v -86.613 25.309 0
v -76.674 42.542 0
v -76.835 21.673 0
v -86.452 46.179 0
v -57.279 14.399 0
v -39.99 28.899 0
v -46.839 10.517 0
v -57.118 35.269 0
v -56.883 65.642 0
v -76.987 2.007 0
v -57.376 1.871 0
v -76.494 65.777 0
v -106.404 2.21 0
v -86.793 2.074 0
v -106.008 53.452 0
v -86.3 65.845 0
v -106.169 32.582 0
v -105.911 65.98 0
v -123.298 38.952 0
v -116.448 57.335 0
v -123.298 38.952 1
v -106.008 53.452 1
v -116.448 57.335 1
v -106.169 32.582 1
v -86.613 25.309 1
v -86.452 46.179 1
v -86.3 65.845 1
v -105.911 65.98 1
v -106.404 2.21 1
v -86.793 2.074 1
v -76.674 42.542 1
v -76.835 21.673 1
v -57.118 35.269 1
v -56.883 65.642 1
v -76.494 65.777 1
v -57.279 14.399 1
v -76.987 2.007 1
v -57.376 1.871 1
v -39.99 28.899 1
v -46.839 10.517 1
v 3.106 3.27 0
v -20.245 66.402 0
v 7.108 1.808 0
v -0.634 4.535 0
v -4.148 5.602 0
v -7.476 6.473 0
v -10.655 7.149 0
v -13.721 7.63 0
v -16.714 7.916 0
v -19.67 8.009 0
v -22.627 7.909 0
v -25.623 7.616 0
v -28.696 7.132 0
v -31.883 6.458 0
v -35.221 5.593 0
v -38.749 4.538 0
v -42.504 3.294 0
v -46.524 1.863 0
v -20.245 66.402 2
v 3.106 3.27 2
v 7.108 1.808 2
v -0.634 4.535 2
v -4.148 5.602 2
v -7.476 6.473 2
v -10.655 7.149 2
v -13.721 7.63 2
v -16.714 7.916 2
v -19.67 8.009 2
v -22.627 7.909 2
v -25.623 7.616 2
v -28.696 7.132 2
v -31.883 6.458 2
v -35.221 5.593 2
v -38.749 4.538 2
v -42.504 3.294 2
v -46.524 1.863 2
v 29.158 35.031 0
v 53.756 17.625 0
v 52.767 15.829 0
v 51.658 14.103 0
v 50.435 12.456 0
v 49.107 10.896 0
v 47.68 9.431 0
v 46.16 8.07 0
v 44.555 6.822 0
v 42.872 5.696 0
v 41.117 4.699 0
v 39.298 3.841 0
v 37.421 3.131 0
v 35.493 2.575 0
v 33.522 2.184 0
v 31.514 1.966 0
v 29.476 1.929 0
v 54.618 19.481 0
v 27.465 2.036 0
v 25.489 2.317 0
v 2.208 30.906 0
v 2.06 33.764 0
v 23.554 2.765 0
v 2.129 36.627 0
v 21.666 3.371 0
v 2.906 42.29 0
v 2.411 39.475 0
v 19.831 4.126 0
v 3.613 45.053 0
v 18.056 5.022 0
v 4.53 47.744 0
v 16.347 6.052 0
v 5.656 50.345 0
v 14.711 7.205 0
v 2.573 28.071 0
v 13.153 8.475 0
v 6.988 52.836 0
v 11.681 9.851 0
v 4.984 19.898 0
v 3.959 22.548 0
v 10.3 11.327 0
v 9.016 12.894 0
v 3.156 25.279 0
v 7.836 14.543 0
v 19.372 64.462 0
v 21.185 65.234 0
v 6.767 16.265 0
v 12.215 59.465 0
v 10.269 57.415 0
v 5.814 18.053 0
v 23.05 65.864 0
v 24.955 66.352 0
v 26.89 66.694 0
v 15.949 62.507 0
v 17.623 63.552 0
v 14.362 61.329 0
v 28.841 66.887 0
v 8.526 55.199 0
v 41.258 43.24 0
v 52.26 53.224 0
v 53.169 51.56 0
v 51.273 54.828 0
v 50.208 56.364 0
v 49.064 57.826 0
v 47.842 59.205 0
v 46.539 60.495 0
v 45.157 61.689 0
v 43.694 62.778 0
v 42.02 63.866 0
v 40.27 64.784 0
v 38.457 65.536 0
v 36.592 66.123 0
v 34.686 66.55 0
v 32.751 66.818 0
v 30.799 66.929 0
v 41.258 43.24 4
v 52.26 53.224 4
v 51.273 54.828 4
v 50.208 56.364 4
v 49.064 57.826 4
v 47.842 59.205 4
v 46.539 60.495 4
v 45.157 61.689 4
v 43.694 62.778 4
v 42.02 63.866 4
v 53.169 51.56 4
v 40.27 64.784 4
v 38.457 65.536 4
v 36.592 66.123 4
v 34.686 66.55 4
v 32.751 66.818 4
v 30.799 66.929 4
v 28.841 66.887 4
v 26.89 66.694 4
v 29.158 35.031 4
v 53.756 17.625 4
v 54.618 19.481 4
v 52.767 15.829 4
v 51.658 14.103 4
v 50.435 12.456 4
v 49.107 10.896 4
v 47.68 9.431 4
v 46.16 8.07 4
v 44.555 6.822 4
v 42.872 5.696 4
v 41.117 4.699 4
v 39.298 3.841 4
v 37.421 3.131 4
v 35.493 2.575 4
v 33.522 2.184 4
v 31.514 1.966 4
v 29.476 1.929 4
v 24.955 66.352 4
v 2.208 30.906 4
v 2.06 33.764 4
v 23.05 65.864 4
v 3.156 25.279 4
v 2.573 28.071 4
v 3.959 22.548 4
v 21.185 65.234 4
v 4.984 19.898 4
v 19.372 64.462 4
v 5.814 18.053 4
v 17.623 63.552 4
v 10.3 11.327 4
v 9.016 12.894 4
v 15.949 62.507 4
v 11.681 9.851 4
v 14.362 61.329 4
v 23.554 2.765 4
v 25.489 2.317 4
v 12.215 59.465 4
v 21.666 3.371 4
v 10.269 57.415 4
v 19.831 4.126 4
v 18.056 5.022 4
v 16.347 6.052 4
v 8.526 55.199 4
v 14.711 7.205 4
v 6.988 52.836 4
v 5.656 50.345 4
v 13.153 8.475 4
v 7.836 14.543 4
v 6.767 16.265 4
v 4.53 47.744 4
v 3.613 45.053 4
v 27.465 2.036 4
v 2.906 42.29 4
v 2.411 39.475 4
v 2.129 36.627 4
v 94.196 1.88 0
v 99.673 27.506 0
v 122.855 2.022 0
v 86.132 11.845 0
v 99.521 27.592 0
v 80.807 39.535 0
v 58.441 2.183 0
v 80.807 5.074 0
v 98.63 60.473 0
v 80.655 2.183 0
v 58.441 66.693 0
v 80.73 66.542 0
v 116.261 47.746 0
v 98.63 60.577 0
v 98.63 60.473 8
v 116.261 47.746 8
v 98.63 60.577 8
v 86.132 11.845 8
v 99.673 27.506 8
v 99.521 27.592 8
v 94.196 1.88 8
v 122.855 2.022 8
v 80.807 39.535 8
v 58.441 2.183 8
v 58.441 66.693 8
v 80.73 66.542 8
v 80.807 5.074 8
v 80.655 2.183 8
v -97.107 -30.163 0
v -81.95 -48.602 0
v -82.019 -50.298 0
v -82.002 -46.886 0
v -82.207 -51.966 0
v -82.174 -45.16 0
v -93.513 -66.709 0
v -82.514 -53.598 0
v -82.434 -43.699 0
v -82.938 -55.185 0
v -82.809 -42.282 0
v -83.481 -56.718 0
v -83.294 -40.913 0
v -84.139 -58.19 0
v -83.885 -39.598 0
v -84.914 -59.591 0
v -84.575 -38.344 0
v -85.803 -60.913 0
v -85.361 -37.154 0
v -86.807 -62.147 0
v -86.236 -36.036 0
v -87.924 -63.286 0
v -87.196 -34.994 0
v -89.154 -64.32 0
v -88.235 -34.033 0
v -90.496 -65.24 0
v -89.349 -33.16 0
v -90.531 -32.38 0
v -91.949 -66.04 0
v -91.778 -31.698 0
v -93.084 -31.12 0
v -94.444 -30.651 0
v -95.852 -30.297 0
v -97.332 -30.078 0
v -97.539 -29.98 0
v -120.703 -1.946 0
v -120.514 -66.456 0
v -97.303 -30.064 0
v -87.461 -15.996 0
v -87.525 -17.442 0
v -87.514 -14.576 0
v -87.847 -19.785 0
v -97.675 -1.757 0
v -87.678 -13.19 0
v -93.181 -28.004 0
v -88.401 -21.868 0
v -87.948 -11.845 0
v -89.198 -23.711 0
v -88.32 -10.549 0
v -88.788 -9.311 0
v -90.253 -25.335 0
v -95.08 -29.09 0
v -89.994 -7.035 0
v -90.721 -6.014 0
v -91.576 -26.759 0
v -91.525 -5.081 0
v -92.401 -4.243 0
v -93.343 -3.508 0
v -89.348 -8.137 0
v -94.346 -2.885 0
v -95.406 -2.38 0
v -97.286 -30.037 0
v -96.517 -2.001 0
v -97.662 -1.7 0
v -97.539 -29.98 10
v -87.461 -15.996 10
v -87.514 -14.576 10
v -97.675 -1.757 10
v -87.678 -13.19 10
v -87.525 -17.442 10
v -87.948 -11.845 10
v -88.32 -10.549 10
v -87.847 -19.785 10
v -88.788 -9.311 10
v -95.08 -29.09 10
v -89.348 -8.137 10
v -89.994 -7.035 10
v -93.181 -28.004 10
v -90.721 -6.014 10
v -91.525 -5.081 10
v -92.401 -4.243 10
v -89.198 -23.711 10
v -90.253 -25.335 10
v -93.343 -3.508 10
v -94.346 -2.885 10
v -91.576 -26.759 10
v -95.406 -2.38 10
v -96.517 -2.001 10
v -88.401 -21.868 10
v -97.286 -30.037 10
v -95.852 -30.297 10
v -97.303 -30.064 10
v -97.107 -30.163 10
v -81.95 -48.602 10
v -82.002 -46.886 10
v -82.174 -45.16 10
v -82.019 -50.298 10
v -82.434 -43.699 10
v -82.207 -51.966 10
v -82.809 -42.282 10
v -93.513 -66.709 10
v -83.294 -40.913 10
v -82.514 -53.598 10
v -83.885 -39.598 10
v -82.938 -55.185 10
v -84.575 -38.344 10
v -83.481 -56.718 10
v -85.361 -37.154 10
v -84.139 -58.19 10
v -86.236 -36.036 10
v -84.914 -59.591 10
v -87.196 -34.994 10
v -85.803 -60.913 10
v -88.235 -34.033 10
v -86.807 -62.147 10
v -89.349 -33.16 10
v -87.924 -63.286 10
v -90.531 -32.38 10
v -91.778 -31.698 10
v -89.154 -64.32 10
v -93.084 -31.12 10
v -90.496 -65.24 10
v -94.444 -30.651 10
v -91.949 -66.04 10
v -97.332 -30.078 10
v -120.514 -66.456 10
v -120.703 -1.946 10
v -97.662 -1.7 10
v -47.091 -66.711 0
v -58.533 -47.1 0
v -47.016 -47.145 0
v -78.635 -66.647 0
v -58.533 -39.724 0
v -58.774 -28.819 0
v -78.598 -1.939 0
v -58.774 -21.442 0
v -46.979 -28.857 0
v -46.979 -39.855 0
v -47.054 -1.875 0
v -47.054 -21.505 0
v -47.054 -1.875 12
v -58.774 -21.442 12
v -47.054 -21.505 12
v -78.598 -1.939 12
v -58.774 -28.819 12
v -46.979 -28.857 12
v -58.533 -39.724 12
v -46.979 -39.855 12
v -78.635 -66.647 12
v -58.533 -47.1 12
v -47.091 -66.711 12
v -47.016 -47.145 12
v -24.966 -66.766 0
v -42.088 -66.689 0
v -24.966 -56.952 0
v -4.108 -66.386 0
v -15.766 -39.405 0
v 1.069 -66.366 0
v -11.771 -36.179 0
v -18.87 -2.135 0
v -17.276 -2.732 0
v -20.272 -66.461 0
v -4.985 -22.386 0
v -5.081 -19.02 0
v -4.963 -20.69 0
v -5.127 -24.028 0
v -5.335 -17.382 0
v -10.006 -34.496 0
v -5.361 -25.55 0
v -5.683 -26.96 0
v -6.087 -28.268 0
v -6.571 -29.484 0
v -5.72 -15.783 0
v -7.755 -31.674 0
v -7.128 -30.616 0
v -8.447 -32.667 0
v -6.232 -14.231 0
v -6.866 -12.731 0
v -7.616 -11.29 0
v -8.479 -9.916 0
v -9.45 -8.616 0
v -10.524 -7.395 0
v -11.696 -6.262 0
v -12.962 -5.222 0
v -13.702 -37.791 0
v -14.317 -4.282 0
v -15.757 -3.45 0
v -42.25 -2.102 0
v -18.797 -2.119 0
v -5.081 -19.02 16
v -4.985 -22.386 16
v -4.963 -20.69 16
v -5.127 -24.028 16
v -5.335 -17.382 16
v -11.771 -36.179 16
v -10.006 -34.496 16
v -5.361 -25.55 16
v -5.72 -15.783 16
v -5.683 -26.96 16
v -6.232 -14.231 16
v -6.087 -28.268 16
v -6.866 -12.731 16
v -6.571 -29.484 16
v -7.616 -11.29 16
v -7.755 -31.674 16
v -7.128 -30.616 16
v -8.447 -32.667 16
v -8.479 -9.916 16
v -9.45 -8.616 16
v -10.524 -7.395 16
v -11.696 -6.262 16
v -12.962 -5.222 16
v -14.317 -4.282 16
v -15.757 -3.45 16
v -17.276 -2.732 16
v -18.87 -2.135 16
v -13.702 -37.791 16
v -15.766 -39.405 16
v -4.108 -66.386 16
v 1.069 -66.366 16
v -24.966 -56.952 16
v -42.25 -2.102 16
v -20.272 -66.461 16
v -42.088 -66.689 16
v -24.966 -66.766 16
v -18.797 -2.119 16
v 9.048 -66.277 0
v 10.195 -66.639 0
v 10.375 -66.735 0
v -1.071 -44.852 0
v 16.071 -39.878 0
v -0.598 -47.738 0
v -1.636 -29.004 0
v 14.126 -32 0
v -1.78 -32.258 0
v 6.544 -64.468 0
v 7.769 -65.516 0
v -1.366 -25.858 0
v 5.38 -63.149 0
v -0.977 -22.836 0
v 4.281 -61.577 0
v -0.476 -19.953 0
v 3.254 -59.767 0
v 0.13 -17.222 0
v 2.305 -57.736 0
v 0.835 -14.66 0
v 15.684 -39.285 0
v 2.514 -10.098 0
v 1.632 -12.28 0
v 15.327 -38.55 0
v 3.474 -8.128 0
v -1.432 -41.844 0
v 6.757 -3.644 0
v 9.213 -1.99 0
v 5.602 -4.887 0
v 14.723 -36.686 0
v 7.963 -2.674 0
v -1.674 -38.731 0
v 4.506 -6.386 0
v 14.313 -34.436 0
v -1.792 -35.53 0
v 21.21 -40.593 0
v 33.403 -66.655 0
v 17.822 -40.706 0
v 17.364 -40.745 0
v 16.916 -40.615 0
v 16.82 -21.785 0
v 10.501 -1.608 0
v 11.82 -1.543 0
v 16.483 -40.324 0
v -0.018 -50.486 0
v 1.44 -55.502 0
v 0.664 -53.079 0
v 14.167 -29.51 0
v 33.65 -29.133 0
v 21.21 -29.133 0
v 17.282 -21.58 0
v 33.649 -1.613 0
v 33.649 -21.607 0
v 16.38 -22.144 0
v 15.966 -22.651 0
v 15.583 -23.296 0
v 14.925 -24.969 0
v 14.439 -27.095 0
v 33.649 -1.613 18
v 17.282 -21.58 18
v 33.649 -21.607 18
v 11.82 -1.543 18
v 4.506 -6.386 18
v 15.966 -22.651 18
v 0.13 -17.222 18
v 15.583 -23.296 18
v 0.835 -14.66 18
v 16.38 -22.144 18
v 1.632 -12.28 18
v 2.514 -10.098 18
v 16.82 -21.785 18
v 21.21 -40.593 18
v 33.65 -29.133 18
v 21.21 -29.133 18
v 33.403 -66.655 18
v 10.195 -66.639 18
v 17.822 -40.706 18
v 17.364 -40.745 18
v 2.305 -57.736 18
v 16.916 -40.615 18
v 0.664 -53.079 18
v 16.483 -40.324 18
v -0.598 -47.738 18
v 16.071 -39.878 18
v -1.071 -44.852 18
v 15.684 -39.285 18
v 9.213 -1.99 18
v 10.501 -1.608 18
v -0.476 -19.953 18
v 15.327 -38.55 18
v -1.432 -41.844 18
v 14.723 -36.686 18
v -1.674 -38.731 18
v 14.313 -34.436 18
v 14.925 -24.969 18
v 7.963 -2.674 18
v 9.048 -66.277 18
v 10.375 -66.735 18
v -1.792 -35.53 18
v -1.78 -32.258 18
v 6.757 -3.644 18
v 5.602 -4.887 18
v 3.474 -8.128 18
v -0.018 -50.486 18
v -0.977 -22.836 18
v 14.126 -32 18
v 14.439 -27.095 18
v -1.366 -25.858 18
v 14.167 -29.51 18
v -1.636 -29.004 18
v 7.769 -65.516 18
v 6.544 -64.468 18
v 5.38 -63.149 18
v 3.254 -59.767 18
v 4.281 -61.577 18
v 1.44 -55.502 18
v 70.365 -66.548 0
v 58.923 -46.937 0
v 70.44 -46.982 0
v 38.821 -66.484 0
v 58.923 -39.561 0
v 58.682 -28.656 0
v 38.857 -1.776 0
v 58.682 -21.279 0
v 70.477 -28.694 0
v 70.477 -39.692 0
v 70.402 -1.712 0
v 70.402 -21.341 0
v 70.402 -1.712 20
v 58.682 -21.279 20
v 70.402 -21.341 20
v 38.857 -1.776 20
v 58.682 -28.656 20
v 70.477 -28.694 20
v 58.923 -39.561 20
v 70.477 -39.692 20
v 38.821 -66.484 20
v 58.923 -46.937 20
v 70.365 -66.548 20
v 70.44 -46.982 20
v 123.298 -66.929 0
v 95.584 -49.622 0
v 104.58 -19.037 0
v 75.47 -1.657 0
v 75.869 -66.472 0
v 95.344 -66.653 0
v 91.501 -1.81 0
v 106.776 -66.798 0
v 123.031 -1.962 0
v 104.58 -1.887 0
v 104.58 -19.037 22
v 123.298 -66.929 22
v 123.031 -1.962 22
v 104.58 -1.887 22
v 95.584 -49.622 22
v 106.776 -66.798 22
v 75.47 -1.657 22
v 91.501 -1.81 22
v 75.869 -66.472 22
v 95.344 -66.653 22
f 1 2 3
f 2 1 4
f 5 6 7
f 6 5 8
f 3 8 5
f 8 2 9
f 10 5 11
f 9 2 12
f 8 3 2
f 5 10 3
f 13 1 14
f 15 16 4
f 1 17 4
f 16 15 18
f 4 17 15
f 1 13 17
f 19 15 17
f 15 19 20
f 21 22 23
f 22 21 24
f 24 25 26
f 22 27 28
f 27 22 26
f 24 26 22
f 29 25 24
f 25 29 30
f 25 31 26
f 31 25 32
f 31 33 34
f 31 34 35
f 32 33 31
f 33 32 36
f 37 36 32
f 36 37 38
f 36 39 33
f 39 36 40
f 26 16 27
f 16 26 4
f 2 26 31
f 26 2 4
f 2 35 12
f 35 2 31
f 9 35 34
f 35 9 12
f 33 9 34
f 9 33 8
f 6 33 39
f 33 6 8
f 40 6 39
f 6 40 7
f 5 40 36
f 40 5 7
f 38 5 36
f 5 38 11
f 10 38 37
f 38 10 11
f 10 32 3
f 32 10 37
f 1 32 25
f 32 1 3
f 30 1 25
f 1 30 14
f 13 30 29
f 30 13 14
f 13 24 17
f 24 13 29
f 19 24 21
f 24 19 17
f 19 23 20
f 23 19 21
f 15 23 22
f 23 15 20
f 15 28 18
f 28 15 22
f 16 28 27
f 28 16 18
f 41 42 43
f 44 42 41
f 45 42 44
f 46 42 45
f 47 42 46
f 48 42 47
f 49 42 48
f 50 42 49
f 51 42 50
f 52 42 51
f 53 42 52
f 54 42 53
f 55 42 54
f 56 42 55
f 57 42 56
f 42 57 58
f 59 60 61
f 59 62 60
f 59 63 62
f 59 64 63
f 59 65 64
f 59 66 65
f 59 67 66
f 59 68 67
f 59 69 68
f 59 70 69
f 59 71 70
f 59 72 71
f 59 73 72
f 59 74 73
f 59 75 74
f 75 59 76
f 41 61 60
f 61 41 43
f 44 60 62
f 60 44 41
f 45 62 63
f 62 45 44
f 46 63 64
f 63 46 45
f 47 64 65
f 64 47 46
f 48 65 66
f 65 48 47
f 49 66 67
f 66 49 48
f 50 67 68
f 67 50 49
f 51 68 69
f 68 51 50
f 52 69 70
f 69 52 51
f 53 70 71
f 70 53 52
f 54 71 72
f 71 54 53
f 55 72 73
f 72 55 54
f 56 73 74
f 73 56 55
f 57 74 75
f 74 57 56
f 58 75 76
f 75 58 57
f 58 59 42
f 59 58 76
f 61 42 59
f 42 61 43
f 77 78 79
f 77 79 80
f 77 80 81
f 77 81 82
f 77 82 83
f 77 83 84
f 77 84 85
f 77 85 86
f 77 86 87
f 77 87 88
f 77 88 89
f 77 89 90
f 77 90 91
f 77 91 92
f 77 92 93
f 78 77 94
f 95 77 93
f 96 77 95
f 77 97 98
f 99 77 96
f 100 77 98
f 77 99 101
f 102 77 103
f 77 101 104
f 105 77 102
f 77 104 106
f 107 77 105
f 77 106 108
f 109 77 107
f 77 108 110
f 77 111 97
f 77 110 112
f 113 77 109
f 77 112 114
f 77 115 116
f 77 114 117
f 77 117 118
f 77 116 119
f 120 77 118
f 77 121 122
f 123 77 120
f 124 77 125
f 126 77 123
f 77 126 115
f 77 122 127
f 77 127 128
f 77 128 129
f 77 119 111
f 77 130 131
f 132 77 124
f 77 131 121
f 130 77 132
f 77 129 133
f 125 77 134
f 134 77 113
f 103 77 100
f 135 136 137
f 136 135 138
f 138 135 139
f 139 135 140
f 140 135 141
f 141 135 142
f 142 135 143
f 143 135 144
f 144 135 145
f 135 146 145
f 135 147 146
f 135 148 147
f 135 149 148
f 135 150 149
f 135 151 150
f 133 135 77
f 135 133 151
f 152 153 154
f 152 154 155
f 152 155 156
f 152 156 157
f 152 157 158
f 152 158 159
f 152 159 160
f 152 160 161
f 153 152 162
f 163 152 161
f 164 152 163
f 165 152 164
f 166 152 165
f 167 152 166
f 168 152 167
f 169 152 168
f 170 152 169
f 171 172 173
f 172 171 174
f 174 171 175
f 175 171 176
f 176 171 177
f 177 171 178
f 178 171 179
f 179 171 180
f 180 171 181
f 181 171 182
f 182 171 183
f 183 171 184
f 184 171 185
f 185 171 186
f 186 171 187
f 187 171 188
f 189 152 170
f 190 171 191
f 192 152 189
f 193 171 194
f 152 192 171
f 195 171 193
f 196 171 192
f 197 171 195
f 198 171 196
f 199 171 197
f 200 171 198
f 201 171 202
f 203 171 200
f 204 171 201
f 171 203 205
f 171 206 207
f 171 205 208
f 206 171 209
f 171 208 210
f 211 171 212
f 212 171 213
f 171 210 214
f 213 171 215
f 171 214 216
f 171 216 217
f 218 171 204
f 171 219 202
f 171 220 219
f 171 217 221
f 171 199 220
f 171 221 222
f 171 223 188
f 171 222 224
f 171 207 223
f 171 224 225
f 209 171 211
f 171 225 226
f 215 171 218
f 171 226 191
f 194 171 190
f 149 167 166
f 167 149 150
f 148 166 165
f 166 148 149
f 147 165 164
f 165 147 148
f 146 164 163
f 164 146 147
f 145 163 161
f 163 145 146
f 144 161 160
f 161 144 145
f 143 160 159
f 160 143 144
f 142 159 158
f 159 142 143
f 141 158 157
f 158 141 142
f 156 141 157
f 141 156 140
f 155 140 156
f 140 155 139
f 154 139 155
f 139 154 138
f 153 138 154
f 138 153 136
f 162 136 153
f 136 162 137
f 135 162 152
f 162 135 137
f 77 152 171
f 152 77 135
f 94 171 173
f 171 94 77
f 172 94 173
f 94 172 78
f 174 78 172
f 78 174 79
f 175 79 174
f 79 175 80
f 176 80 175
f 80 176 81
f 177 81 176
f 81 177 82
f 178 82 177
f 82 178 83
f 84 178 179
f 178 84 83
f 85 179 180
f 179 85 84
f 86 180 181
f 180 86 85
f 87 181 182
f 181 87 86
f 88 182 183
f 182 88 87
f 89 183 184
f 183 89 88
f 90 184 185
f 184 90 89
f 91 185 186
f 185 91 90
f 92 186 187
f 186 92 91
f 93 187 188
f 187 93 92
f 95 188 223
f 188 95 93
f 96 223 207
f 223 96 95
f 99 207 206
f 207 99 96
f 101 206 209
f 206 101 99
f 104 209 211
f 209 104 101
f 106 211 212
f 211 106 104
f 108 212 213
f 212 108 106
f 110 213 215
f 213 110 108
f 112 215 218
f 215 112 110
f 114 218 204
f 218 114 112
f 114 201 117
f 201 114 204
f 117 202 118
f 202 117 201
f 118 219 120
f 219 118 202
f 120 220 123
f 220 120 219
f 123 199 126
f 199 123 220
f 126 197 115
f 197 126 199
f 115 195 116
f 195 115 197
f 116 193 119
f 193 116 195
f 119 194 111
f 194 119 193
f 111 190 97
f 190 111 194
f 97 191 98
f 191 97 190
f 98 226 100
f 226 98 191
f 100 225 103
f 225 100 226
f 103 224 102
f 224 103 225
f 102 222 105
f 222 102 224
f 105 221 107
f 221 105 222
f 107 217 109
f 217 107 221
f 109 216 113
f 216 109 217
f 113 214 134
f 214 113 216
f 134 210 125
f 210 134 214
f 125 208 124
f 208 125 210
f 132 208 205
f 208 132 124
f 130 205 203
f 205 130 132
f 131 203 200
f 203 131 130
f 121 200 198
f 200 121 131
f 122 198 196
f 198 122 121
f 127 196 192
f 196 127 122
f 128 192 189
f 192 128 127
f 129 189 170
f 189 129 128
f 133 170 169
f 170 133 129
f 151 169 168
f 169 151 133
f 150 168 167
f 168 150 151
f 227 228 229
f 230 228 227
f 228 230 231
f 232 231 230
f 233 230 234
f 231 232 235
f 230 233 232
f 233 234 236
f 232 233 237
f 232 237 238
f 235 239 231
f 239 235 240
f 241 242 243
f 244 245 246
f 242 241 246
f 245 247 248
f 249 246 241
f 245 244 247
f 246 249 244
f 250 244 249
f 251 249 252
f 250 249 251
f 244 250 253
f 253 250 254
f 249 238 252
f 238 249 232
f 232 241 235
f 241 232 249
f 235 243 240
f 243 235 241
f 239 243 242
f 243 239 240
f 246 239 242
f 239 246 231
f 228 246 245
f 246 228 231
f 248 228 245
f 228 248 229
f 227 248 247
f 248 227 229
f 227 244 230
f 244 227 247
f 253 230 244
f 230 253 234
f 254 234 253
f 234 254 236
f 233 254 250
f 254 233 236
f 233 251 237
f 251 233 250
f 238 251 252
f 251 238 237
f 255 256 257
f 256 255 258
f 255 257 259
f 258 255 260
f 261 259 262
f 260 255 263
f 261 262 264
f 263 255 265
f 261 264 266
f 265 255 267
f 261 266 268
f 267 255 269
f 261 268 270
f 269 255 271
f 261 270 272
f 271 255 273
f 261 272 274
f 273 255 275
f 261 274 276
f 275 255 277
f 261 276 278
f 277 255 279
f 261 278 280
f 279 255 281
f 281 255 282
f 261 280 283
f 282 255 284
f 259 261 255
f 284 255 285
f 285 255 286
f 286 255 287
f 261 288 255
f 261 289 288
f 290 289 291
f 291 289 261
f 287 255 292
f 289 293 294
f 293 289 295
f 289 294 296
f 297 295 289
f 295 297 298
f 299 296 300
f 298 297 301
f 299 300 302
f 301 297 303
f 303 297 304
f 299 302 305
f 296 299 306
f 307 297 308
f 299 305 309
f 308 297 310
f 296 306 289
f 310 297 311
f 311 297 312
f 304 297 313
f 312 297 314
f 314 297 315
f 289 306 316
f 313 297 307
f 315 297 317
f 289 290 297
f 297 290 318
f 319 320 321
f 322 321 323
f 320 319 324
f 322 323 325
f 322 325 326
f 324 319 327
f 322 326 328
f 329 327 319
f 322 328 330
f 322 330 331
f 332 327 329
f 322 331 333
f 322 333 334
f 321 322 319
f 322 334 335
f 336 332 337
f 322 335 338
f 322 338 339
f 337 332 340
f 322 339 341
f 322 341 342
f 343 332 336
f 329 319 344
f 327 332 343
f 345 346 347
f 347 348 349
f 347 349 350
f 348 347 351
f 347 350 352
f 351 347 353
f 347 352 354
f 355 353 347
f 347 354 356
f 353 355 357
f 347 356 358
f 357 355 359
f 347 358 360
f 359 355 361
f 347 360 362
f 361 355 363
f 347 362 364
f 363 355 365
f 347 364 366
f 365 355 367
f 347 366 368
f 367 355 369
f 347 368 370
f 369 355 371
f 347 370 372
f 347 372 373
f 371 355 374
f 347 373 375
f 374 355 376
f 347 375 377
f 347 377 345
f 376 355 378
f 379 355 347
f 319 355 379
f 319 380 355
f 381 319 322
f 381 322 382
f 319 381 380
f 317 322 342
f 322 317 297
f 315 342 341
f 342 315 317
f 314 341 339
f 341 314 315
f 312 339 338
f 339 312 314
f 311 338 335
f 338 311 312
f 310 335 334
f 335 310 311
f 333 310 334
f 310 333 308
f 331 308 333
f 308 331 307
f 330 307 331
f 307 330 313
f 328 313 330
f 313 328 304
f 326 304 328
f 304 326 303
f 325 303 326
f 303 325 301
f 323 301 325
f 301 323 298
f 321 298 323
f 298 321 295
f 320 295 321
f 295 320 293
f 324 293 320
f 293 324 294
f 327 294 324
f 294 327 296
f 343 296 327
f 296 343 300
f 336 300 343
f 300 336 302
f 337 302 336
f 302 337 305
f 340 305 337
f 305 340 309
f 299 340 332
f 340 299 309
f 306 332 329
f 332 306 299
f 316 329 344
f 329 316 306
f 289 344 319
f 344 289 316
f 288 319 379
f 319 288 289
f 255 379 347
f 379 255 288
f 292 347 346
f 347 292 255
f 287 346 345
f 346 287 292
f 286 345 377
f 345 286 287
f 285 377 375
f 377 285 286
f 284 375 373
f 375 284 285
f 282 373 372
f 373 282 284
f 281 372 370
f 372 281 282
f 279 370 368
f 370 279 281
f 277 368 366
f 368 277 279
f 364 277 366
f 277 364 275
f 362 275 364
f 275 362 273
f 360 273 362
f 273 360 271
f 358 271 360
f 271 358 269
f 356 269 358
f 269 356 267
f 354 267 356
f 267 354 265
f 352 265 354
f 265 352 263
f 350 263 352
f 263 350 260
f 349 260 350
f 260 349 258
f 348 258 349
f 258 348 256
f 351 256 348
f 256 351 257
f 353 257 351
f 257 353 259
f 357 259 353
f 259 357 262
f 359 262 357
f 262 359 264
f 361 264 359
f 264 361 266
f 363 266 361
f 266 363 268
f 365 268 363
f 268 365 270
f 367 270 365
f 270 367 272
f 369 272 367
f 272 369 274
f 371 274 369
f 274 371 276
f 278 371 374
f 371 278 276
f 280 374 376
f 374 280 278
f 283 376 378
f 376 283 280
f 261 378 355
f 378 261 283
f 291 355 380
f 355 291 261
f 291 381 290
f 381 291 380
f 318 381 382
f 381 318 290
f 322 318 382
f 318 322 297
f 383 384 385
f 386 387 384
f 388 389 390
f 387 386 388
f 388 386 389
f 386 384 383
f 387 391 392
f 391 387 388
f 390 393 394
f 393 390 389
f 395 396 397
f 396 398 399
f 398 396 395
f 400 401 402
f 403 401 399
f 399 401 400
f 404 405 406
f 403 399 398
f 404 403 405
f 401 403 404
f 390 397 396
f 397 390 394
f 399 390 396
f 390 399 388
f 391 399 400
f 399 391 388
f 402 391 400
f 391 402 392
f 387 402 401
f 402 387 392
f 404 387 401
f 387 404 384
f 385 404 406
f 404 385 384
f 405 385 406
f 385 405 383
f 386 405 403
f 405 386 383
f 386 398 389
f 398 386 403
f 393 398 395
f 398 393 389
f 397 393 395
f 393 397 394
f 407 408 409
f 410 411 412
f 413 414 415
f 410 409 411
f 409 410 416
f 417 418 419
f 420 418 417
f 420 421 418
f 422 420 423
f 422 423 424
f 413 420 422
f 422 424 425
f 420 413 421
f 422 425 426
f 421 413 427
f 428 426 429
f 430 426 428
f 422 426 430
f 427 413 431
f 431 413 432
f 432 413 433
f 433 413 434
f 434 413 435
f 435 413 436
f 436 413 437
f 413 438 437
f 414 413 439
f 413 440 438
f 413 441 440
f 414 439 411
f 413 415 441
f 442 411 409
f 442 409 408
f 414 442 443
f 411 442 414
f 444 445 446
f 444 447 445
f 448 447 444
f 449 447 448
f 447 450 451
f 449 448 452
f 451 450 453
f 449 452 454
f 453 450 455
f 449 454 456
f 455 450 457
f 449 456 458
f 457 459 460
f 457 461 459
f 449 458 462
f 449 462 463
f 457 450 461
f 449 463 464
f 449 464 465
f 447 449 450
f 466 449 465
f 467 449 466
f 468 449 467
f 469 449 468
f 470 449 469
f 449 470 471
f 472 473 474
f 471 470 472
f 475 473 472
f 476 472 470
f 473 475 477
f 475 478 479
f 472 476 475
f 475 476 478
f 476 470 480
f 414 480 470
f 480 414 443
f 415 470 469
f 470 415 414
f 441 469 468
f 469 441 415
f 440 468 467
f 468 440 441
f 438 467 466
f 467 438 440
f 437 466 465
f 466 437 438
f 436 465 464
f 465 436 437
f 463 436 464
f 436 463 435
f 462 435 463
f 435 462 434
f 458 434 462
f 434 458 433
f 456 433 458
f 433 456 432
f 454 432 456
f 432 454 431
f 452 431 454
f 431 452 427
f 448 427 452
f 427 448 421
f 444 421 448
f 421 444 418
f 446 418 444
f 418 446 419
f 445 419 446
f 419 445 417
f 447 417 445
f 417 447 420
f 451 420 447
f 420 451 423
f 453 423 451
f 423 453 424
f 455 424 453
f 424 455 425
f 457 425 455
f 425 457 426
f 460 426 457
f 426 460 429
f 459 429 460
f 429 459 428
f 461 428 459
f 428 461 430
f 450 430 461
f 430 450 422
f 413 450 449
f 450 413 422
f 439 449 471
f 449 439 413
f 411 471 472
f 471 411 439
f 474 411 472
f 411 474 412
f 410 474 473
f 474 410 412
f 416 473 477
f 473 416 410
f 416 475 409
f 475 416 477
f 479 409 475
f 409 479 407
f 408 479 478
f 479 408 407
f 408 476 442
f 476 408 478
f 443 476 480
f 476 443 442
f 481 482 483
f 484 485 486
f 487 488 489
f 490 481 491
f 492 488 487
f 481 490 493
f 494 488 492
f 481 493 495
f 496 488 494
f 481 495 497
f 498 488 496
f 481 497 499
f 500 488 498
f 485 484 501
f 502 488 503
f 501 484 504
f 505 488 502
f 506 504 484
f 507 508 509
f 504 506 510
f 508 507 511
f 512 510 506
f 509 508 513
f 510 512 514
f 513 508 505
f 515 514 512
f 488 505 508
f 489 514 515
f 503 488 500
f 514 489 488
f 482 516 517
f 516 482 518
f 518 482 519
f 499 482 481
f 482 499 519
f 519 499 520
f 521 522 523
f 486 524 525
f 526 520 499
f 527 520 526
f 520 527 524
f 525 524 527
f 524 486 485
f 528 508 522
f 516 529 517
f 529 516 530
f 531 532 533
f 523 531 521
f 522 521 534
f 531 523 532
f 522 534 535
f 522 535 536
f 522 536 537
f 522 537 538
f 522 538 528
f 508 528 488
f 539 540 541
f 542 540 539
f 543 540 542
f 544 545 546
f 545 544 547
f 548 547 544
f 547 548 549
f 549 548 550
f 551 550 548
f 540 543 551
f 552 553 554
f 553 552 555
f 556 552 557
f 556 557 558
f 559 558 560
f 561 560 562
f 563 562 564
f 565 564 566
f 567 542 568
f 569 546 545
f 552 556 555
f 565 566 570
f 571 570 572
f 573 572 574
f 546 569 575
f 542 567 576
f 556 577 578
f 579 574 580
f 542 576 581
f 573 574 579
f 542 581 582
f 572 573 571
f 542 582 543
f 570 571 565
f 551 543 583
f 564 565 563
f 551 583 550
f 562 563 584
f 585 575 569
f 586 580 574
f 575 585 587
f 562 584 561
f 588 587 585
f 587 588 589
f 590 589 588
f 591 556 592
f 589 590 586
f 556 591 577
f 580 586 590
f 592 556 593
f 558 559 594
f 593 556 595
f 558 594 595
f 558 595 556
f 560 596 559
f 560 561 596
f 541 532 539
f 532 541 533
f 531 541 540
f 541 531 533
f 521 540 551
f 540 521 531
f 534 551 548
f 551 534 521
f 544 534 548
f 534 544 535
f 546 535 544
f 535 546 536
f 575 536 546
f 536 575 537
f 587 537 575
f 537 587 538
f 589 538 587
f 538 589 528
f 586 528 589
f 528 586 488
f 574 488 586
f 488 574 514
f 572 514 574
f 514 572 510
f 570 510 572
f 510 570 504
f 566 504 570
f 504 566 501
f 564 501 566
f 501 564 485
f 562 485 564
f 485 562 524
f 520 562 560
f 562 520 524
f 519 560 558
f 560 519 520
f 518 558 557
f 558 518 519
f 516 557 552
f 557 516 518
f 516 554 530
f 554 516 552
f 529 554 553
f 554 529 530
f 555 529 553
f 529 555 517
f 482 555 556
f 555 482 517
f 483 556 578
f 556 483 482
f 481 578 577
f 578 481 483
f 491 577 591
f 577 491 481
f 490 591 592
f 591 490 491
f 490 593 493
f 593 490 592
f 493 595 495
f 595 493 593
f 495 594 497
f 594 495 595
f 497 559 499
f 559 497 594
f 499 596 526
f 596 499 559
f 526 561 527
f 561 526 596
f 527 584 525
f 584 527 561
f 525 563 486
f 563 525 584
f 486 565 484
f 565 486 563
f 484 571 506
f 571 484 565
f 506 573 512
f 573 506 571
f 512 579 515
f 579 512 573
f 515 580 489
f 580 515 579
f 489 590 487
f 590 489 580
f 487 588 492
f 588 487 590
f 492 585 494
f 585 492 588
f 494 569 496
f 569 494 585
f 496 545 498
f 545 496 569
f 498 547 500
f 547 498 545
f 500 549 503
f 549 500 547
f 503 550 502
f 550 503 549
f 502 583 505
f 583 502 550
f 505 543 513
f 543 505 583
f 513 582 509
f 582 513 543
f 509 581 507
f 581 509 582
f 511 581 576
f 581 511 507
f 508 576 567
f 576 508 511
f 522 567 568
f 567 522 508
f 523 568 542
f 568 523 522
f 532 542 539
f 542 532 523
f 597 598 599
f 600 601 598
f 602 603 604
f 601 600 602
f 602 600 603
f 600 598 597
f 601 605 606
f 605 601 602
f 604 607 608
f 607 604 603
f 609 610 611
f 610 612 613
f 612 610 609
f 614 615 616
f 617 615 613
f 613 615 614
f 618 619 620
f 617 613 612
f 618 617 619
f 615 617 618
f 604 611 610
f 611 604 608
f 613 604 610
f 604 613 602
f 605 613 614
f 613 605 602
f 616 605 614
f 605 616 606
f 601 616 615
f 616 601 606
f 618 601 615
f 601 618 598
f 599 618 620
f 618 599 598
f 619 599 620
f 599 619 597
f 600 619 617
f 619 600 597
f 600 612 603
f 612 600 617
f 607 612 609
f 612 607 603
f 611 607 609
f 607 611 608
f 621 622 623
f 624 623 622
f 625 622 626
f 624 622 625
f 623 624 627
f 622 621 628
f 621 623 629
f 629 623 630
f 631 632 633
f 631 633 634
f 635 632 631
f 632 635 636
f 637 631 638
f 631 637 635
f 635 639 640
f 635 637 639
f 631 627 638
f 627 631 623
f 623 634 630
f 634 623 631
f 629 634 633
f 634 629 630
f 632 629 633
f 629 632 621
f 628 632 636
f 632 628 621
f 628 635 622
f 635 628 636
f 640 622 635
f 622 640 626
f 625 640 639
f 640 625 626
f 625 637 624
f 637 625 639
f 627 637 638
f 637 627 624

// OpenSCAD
// Module names are of the form poly_<inkscape-path-id>().  As a result,
// you can associate a polygon in this OpenSCAD program with the corresponding
// SVG element in the Inkscape document by looking for the XML element with
// the attribute id="inkscape-path-id".

// fudge value is used to ensure that subtracted solids are a tad taller
// in the z dimension than the polygon being subtracted from.  This helps
// keep the resulting .stl file manifold.
fudge = 0.1;

module poly_path_H(h)
{
  scale([25.4/90, -25.4/90, 1]) union()
  {
    linear_extrude(height=h)
      polygon([[-201.553648,-232.588716],[-202.385721,-124.969356],[-141.695201,-102.397895],[-165.966669,-37.264154],[-202.957472,-51.021434],[-203.300600,-6.631294],[-272.789322,-7.110513],[-272.250629,-76.792363],[-306.897196,-89.677827],[-307.533683,-7.350133],[-377.022555,-7.829374],[-376.190461,-115.448713],[-436.881002,-138.020195],[-412.609534,-203.153936],[-375.618731,-189.396656],[-375.275603,-233.786818],[-305.786730,-233.307577],[-306.325575,-163.625728],[-271.678878,-150.740263],[-271.042370,-233.067957]]);
  }
}

module poly_path_C(h)
{
  scale([25.4/90, -25.4/90, 1]) union()
  {
    linear_extrude(height=h)
      polygon([[103.316769,-124.125983],[193.527420,-69.028527],[190.472696,-62.449275],[186.968238,-56.087028],[183.038615,-49.972204],[178.708398,-44.135227],[174.002157,-38.606516],[168.944461,-33.416494],[163.559881,-28.595580],[157.872988,-24.174197],[151.908352,-20.182765],[145.690542,-16.651706],[139.244129,-13.611440],[132.593684,-11.092389],[125.763775,-9.124974],[118.778975,-7.739616],[111.663852,-6.966737],[104.442977,-6.836756],[97.318336,-7.213776],[90.316112,-8.210391],[83.458666,-9.796752],[76.768360,-11.943011],[70.267556,-14.619319],[63.978614,-17.795828],[57.923896,-21.442689],[52.125763,-25.530054],[46.606576,-30.028074],[41.388698,-34.906901],[36.494489,-40.136685],[31.946310,-45.687579],[27.766524,-51.529735],[23.977490,-57.633302],[20.601571,-63.968434],[17.661129,-70.505280],[14.029701,-79.896029],[11.183002,-89.571860],[9.115964,-99.465523],[7.823518,-109.509769],[7.300596,-119.637347],[7.542131,-129.781008],[8.543055,-139.873502],[10.298299,-149.847579],[12.802796,-159.635989],[16.051477,-169.171484],[20.039275,-178.386812],[24.761122,-187.214724],[30.211949,-195.587971],[36.386689,-203.439302],[43.280273,-210.701469],[50.887635,-217.307220],[56.511103,-221.481968],[62.442250,-225.185559],[68.640070,-228.408845],[75.063560,-231.142681],[81.671718,-233.377922],[88.423540,-235.105422],[95.278023,-236.316034],[102.194163,-237.000613],[109.130957,-237.150013],[116.047402,-236.755089],[122.902494,-235.806694],[129.655231,-234.295683],[136.264608,-232.212911],[142.689622,-229.549230],[148.889271,-226.295496],[154.822550,-222.442563],[160.005583,-218.581517],[164.903420,-214.352704],[169.517728,-209.781744],[173.850175,-204.894257],[177.902428,-199.715866],[181.676153,-194.272190],[185.173016,-188.588850],[188.394686,-182.691467],[146.190583,-153.211947],[103.316769,-124.125983]]);
  }
}

module poly_path_A(h)
{
  scale([25.4/90, -25.4/90, 1]) union()
  {
    linear_extrude(height=h)
      polygon([[25.185905,-6.407911],[11.005591,-11.588235],[-2.245006,-16.068347],[-14.699310,-19.850627],[-26.490743,-22.937452],[-37.752729,-25.331203],[-48.618689,-27.034259],[-59.222048,-28.048999],[-69.696228,-28.377803],[-80.174652,-28.023050],[-90.790742,-26.987119],[-101.677922,-25.272390],[-112.969615,-22.881242],[-124.799244,-19.816055],[-137.300231,-16.079207],[-150.605999,-11.673078],[-164.849972,-6.600047],[-118.804095,-119.682547],[-71.733773,-235.280996]]);
  }
}

module poly_path_K(h)
{
  scale([25.4/90, -25.4/90, 1]) union()
  {
    linear_extrude(height=h)
      polygon([[207.073609,-236.315168],[286.051533,-235.777488],[286.323176,-140.086038],[349.475994,-214.275629],[349.475994,-214.643512],[411.949672,-169.177754],[352.634274,-97.767152],[353.171932,-97.461524],[435.313657,-7.163906],[333.764229,-6.660168],[305.193221,-41.972139],[286.323176,-17.979927],[285.785518,-7.735549],[207.073609,-7.735549]]);
  }
}

module poly_path_B(h)
{
  scale([25.4/90, -25.4/90, 1]) union()
  {
    linear_extrude(height=h)
      polygon([[-344.775642,106.525192],[-339.632127,107.353174],[-334.642638,108.607424],[-329.825403,110.268462],[-325.198647,112.316808],[-320.780597,114.732984],[-316.589478,117.497509],[-312.643518,120.590904],[-308.960941,123.993689],[-305.559975,127.686385],[-302.458846,131.649512],[-299.675779,135.863590],[-297.229001,140.309140],[-295.136738,144.966683],[-293.417216,149.816738],[-292.088662,154.839826],[-291.169301,160.016468],[-290.557207,166.133215],[-290.373969,172.211515],[-290.616920,178.221189],[-291.283393,184.132056],[-292.370722,189.913939],[-293.876240,195.536658],[-295.797280,200.970035],[-298.131176,206.183890],[-300.875260,211.148045],[-304.026866,215.832321],[-307.583327,220.206538],[-311.541977,224.240519],[-315.900148,227.904083],[-320.655174,231.167053],[-325.804388,233.999249],[-331.345123,236.370492],[-427.016799,235.475624],[-427.688177,6.895962],[-346.046631,6.022400],[-346.092132,6.224240],[-341.989631,7.090235],[-338.051873,8.431494],[-334.296549,10.220680],[-330.741346,12.430458],[-327.403955,15.033491],[-324.302065,18.002442],[-321.453366,21.309976],[-318.875547,24.928756],[-316.586298,28.831447],[-314.603307,32.990712],[-312.944265,37.379214],[-311.626861,41.969618],[-310.668785,46.734587],[-310.087725,51.646786],[-309.901372,56.678877],[-310.127414,61.803525],[-311.268559,70.104113],[-313.230274,77.484323],[-316.056888,84.015471],[-319.792731,89.768875],[-324.482131,94.815852],[-330.169416,99.227718],[-336.898917,103.075792],[-344.714961,106.431388],[-345.610375,106.228752],[-344.878808,106.576930],[-344.080465,106.875788],[-344.775556,106.525192]]);
  }
}

module poly_path_R(h)
{
  scale([25.4/90, -25.4/90, 1]) union()
  {
    linear_extrude(height=h)
      polygon([[-66.861231,7.566649],[-61.212850,9.681432],[-55.830262,12.224991],[-50.730041,15.173155],[-45.928762,18.501749],[-41.442998,22.186601],[-37.289325,26.203537],[-33.484316,30.528384],[-30.044546,35.136969],[-26.986588,40.005118],[-24.327018,45.108658],[-22.082409,50.423416],[-20.269336,55.925218],[-18.904374,61.589892],[-18.004095,67.393264],[-17.585076,73.311161],[-17.663889,79.319409],[-18.166077,85.139620],[-18.995277,90.531632],[-20.135279,95.528599],[-21.569871,100.163676],[-23.282845,104.470016],[-25.257988,108.480774],[-27.479092,112.229105],[-29.929946,115.748162],[-35.456060,122.231073],[-41.706649,128.194741],[-48.552030,133.904402],[-55.862519,139.625289],[3.786993,235.156691],[-14.556716,235.224618],[-71.828892,235.490611],[-88.463299,201.797393],[-88.463299,236.571642],[-149.131457,236.299977],[-149.703208,7.448693],[-66.602893,7.507779]]);
  }
}

module poly_path_N(h)
{
  scale([25.4/90, -25.4/90, 1]) union()
  {
    linear_extrude(height=h)
      polygon([[370.558712,6.685647],[435.935868,6.951684],[436.881002,237.150013],[378.340964,236.685867],[338.682270,175.825293],[337.833226,236.170851],[268.828058,235.531260],[267.413172,5.870632],[324.215617,6.413983],[370.558712,67.455695]]);
  }
}

module poly_path_E2(h)
{
  scale([25.4/90, -25.4/90, 1]) union()
  {
    linear_extrude(height=h)
      polygon([[137.683241,6.291714],[137.552993,235.573180],[249.324050,235.799560],[249.590172,166.471793],[208.782478,166.313297],[208.782478,140.176015],[249.720333,140.640161],[249.720333,101.671908],[207.927763,101.536054],[207.927763,75.398751],[249.454340,75.619503],[249.454340,6.065334]]);
  }
}

module poly_path_E1(h)
{
  scale([25.4/90, -25.4/90, 1]) union()
  {
    linear_extrude(height=h)
      polygon([[-278.498507,6.869632],[-278.628755,236.151077],[-166.857698,236.377457],[-166.591576,167.049690],[-207.399270,166.891194],[-207.399270,140.753847],[-166.461415,141.217993],[-166.461415,102.249762],[-208.253985,102.113908],[-208.253985,75.976626],[-166.727408,76.197356],[-166.727408,6.643166]]);
  }
}

module poly_path_G(h)
{
  scale([25.4/90, -25.4/90, 1]) union()
  {
    linear_extrude(height=h)
      polygon([[118.355864,236.179132],[119.233351,103.228708],[75.152353,103.228708],[75.152353,143.832621],[63.150435,144.233627],[61.525616,144.371217],[59.938081,143.911970],[58.405205,142.880322],[56.944361,141.300711],[55.572923,139.197571],[54.308264,136.595340],[52.168780,129.991349],[50.715363,122.018622],[50.053950,113.386915],[50.198304,104.561471],[51.162189,96.007532],[52.884234,88.471330],[55.215580,82.545390],[56.573016,80.259621],[58.038708,78.464442],[59.597967,77.189195],[61.236103,76.463220],[119.227011,76.559396],[119.227011,5.714745],[41.882180,5.466973],[37.208269,5.697990],[32.644184,7.050927],[28.213879,9.473114],[23.941310,12.911881],[19.850431,17.314559],[15.965197,22.628479],[12.309563,28.800970],[8.907484,35.779364],[5.782914,43.510990],[2.959808,51.943179],[0.462121,61.023262],[-1.686192,70.698569],[-3.461176,80.916430],[-4.838877,91.624177],[-5.795339,102.769139],[-6.306609,114.298646],[-6.349846,125.895134],[-5.931955,137.237054],[-5.073603,148.265778],[-3.795462,158.922674],[-2.118200,169.149114],[-0.062488,178.886468],[2.351006,188.076106],[5.101611,196.659398],[8.168659,204.577714],[11.531479,211.772425],[15.169402,218.184900],[19.061758,223.756511],[23.187879,228.428627],[27.527093,232.142618],[32.058732,234.839855],[36.762126,236.461708],[36.122966,236.122332]]);
  }
}

poly_path_H(1);
poly_path_A(2);
poly_path_C(4);
poly_path_K(8);
poly_path_B(10);
poly_path_E1(12);
poly_path_R(16);
poly_path_G(18);
poly_path_E2(20);
poly_path_N(22);
